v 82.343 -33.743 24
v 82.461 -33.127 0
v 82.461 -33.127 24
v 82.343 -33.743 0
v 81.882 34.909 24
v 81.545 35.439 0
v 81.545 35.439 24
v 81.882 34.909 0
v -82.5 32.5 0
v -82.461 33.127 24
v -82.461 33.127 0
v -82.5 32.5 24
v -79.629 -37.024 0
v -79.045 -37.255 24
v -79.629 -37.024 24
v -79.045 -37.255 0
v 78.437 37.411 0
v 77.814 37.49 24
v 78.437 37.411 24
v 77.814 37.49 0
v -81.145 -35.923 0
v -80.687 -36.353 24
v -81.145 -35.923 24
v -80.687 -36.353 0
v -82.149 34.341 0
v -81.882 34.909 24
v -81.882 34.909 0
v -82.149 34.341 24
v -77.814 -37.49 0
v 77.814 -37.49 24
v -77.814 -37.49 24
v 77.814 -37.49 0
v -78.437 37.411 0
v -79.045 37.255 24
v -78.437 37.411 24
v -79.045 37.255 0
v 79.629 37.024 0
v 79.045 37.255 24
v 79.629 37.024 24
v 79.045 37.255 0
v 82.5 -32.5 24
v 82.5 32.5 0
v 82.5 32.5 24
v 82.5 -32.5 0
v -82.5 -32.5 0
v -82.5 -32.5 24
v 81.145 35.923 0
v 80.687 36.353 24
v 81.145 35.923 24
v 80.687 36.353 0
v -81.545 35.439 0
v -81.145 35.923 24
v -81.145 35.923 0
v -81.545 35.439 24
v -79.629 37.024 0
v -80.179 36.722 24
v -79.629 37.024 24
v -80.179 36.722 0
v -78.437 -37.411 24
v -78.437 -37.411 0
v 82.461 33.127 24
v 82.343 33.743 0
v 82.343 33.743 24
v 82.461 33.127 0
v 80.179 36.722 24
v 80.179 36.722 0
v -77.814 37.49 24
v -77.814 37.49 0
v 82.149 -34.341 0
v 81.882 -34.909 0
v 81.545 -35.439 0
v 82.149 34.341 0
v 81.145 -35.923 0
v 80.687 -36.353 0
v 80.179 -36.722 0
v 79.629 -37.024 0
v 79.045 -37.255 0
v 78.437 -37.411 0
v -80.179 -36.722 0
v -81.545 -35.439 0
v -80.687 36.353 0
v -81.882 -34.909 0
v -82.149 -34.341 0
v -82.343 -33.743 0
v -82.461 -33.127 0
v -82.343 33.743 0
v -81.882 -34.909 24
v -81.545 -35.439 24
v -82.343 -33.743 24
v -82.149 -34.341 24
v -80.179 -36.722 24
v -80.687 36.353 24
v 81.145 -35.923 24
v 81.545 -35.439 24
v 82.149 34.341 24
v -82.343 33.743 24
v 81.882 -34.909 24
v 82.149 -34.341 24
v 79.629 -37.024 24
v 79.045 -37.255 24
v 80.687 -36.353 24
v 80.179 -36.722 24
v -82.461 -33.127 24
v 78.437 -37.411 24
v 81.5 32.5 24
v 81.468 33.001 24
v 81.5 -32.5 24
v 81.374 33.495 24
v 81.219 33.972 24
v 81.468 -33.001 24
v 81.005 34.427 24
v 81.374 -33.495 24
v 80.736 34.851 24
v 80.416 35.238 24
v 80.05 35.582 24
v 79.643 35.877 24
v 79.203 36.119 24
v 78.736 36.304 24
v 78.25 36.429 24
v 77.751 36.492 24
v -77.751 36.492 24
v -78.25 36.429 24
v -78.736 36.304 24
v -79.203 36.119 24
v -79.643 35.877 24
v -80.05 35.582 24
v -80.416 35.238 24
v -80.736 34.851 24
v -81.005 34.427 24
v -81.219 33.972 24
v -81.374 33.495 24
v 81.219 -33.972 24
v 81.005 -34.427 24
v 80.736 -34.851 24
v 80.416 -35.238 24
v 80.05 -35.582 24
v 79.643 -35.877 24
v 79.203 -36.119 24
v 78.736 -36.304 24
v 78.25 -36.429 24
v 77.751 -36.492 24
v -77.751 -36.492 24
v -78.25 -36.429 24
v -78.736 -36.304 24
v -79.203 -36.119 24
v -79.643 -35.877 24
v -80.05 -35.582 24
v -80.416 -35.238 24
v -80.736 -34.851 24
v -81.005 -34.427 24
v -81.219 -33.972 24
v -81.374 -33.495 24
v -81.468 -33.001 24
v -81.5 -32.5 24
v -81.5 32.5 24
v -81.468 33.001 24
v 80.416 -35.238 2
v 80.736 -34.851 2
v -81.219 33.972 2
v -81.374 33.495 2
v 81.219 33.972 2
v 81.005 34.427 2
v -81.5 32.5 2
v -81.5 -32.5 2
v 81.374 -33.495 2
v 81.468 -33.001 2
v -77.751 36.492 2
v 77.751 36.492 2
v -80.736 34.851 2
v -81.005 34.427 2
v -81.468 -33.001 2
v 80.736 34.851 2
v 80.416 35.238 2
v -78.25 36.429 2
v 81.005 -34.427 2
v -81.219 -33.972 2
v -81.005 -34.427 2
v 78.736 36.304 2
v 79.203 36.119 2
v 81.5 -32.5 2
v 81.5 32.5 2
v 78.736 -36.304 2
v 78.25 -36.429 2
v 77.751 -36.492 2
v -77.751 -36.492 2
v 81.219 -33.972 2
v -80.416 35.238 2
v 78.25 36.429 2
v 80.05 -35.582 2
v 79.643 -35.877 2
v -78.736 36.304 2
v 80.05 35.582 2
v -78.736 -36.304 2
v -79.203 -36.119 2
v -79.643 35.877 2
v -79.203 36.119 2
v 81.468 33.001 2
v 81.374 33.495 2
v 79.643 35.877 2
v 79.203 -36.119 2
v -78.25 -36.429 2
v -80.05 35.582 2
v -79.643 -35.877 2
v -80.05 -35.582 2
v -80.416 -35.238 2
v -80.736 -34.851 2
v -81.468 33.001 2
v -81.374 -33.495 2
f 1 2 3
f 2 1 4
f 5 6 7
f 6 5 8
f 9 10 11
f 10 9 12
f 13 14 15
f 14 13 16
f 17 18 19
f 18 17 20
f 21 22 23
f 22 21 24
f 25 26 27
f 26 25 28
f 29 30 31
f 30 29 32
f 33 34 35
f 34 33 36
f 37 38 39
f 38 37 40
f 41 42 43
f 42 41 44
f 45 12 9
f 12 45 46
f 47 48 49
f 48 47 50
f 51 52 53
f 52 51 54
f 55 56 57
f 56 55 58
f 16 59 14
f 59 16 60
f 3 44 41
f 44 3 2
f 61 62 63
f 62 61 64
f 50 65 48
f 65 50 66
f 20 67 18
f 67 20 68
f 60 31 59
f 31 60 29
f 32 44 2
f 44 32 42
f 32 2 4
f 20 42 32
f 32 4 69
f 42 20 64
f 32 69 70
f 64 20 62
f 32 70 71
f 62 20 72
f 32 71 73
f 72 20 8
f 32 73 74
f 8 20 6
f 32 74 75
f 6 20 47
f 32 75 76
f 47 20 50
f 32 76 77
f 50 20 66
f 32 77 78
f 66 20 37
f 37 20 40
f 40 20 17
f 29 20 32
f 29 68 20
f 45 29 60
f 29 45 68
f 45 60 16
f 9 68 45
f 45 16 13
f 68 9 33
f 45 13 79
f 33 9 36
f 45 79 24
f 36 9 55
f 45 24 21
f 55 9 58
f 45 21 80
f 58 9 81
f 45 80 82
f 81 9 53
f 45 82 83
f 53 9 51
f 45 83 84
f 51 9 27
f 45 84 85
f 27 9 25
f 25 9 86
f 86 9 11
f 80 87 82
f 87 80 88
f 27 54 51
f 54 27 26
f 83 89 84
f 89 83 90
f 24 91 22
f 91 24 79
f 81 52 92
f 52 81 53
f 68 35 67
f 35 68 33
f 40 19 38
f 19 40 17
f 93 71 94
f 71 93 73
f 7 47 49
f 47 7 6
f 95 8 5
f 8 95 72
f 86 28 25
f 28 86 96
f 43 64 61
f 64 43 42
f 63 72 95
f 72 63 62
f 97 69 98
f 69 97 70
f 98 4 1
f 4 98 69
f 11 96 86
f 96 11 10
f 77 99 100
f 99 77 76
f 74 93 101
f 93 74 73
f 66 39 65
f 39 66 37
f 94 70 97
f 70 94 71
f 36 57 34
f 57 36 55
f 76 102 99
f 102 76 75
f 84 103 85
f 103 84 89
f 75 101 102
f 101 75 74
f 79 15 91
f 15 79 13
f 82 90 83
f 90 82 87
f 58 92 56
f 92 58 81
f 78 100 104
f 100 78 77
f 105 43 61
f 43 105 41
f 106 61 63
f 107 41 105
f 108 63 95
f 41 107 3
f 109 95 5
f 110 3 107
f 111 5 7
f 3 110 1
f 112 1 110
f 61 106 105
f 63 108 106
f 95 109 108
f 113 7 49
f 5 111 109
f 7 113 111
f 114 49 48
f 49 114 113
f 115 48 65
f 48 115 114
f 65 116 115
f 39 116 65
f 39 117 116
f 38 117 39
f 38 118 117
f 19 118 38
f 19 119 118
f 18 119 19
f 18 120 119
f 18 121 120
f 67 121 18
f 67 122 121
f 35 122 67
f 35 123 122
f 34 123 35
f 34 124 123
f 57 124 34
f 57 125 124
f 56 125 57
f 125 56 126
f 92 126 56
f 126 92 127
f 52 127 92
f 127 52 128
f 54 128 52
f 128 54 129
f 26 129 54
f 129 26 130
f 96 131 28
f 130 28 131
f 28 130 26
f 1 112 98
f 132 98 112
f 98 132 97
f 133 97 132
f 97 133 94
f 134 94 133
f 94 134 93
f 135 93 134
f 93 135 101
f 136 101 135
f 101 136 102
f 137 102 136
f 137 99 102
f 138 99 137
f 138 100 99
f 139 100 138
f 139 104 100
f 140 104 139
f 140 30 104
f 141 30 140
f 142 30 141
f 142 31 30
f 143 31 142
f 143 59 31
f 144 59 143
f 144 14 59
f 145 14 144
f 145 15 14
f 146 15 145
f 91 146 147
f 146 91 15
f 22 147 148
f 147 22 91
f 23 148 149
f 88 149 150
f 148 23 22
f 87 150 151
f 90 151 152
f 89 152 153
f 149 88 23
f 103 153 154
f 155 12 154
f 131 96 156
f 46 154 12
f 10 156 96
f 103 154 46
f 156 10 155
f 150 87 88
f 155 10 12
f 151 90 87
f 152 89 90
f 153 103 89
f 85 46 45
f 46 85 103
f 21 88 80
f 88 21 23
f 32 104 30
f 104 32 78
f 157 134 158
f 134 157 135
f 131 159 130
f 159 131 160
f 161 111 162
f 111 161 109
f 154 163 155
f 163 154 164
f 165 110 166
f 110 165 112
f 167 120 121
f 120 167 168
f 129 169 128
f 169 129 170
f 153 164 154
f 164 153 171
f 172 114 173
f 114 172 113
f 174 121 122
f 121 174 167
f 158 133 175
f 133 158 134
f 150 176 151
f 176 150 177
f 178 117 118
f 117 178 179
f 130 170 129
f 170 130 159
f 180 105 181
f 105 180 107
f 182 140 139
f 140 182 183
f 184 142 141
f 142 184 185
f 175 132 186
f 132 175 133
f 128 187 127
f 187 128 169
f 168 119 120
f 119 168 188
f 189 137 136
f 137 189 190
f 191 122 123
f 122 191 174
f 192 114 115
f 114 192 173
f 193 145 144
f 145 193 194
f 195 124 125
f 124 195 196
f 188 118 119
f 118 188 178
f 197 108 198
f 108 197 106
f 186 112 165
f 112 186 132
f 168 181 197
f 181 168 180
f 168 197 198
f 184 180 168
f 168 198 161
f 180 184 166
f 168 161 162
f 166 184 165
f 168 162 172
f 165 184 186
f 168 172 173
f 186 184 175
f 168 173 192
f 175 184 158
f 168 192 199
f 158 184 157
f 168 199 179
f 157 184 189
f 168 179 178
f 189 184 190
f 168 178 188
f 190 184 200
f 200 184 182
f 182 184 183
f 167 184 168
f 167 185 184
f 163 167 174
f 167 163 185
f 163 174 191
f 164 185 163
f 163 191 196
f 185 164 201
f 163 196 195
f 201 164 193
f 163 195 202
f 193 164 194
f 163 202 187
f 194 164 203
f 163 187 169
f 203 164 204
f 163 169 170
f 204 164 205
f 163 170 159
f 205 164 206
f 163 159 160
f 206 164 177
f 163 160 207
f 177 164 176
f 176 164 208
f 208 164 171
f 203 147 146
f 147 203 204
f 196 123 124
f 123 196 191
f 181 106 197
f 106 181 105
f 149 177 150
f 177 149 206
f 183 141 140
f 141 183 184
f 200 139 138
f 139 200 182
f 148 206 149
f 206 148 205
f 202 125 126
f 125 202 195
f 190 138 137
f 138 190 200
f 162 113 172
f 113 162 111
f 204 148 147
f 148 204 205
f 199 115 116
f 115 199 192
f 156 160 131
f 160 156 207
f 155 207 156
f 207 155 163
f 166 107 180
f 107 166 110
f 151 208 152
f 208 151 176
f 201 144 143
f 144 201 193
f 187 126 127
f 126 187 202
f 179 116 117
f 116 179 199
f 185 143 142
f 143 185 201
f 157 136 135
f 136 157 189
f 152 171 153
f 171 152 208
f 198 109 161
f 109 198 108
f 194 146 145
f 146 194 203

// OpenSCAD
$fn = 50;


difference() {
	union() {
		hull() {
			translate(v = [-77.5000000000, 32.5000000000, 0]) {
				cylinder(h = 24, r = 5);
			}
			translate(v = [77.5000000000, 32.5000000000, 0]) {
				cylinder(h = 24, r = 5);
			}
			translate(v = [-77.5000000000, -32.5000000000, 0]) {
				cylinder(h = 24, r = 5);
			}
			translate(v = [77.5000000000, -32.5000000000, 0]) {
				cylinder(h = 24, r = 5);
			}
		}
	}
	union() {
		translate(v = [0, 0, 2]) {
			hull() {
				translate(v = [-77.5000000000, 32.5000000000, 0]) {
					cylinder(h = 22, r = 4);
				}
				translate(v = [77.5000000000, 32.5000000000, 0]) {
					cylinder(h = 22, r = 4);
				}
				translate(v = [-77.5000000000, -32.5000000000, 0]) {
					cylinder(h = 22, r = 4);
				}
				translate(v = [77.5000000000, -32.5000000000, 0]) {
					cylinder(h = 22, r = 4);
				}
			}
		}
	}
}
